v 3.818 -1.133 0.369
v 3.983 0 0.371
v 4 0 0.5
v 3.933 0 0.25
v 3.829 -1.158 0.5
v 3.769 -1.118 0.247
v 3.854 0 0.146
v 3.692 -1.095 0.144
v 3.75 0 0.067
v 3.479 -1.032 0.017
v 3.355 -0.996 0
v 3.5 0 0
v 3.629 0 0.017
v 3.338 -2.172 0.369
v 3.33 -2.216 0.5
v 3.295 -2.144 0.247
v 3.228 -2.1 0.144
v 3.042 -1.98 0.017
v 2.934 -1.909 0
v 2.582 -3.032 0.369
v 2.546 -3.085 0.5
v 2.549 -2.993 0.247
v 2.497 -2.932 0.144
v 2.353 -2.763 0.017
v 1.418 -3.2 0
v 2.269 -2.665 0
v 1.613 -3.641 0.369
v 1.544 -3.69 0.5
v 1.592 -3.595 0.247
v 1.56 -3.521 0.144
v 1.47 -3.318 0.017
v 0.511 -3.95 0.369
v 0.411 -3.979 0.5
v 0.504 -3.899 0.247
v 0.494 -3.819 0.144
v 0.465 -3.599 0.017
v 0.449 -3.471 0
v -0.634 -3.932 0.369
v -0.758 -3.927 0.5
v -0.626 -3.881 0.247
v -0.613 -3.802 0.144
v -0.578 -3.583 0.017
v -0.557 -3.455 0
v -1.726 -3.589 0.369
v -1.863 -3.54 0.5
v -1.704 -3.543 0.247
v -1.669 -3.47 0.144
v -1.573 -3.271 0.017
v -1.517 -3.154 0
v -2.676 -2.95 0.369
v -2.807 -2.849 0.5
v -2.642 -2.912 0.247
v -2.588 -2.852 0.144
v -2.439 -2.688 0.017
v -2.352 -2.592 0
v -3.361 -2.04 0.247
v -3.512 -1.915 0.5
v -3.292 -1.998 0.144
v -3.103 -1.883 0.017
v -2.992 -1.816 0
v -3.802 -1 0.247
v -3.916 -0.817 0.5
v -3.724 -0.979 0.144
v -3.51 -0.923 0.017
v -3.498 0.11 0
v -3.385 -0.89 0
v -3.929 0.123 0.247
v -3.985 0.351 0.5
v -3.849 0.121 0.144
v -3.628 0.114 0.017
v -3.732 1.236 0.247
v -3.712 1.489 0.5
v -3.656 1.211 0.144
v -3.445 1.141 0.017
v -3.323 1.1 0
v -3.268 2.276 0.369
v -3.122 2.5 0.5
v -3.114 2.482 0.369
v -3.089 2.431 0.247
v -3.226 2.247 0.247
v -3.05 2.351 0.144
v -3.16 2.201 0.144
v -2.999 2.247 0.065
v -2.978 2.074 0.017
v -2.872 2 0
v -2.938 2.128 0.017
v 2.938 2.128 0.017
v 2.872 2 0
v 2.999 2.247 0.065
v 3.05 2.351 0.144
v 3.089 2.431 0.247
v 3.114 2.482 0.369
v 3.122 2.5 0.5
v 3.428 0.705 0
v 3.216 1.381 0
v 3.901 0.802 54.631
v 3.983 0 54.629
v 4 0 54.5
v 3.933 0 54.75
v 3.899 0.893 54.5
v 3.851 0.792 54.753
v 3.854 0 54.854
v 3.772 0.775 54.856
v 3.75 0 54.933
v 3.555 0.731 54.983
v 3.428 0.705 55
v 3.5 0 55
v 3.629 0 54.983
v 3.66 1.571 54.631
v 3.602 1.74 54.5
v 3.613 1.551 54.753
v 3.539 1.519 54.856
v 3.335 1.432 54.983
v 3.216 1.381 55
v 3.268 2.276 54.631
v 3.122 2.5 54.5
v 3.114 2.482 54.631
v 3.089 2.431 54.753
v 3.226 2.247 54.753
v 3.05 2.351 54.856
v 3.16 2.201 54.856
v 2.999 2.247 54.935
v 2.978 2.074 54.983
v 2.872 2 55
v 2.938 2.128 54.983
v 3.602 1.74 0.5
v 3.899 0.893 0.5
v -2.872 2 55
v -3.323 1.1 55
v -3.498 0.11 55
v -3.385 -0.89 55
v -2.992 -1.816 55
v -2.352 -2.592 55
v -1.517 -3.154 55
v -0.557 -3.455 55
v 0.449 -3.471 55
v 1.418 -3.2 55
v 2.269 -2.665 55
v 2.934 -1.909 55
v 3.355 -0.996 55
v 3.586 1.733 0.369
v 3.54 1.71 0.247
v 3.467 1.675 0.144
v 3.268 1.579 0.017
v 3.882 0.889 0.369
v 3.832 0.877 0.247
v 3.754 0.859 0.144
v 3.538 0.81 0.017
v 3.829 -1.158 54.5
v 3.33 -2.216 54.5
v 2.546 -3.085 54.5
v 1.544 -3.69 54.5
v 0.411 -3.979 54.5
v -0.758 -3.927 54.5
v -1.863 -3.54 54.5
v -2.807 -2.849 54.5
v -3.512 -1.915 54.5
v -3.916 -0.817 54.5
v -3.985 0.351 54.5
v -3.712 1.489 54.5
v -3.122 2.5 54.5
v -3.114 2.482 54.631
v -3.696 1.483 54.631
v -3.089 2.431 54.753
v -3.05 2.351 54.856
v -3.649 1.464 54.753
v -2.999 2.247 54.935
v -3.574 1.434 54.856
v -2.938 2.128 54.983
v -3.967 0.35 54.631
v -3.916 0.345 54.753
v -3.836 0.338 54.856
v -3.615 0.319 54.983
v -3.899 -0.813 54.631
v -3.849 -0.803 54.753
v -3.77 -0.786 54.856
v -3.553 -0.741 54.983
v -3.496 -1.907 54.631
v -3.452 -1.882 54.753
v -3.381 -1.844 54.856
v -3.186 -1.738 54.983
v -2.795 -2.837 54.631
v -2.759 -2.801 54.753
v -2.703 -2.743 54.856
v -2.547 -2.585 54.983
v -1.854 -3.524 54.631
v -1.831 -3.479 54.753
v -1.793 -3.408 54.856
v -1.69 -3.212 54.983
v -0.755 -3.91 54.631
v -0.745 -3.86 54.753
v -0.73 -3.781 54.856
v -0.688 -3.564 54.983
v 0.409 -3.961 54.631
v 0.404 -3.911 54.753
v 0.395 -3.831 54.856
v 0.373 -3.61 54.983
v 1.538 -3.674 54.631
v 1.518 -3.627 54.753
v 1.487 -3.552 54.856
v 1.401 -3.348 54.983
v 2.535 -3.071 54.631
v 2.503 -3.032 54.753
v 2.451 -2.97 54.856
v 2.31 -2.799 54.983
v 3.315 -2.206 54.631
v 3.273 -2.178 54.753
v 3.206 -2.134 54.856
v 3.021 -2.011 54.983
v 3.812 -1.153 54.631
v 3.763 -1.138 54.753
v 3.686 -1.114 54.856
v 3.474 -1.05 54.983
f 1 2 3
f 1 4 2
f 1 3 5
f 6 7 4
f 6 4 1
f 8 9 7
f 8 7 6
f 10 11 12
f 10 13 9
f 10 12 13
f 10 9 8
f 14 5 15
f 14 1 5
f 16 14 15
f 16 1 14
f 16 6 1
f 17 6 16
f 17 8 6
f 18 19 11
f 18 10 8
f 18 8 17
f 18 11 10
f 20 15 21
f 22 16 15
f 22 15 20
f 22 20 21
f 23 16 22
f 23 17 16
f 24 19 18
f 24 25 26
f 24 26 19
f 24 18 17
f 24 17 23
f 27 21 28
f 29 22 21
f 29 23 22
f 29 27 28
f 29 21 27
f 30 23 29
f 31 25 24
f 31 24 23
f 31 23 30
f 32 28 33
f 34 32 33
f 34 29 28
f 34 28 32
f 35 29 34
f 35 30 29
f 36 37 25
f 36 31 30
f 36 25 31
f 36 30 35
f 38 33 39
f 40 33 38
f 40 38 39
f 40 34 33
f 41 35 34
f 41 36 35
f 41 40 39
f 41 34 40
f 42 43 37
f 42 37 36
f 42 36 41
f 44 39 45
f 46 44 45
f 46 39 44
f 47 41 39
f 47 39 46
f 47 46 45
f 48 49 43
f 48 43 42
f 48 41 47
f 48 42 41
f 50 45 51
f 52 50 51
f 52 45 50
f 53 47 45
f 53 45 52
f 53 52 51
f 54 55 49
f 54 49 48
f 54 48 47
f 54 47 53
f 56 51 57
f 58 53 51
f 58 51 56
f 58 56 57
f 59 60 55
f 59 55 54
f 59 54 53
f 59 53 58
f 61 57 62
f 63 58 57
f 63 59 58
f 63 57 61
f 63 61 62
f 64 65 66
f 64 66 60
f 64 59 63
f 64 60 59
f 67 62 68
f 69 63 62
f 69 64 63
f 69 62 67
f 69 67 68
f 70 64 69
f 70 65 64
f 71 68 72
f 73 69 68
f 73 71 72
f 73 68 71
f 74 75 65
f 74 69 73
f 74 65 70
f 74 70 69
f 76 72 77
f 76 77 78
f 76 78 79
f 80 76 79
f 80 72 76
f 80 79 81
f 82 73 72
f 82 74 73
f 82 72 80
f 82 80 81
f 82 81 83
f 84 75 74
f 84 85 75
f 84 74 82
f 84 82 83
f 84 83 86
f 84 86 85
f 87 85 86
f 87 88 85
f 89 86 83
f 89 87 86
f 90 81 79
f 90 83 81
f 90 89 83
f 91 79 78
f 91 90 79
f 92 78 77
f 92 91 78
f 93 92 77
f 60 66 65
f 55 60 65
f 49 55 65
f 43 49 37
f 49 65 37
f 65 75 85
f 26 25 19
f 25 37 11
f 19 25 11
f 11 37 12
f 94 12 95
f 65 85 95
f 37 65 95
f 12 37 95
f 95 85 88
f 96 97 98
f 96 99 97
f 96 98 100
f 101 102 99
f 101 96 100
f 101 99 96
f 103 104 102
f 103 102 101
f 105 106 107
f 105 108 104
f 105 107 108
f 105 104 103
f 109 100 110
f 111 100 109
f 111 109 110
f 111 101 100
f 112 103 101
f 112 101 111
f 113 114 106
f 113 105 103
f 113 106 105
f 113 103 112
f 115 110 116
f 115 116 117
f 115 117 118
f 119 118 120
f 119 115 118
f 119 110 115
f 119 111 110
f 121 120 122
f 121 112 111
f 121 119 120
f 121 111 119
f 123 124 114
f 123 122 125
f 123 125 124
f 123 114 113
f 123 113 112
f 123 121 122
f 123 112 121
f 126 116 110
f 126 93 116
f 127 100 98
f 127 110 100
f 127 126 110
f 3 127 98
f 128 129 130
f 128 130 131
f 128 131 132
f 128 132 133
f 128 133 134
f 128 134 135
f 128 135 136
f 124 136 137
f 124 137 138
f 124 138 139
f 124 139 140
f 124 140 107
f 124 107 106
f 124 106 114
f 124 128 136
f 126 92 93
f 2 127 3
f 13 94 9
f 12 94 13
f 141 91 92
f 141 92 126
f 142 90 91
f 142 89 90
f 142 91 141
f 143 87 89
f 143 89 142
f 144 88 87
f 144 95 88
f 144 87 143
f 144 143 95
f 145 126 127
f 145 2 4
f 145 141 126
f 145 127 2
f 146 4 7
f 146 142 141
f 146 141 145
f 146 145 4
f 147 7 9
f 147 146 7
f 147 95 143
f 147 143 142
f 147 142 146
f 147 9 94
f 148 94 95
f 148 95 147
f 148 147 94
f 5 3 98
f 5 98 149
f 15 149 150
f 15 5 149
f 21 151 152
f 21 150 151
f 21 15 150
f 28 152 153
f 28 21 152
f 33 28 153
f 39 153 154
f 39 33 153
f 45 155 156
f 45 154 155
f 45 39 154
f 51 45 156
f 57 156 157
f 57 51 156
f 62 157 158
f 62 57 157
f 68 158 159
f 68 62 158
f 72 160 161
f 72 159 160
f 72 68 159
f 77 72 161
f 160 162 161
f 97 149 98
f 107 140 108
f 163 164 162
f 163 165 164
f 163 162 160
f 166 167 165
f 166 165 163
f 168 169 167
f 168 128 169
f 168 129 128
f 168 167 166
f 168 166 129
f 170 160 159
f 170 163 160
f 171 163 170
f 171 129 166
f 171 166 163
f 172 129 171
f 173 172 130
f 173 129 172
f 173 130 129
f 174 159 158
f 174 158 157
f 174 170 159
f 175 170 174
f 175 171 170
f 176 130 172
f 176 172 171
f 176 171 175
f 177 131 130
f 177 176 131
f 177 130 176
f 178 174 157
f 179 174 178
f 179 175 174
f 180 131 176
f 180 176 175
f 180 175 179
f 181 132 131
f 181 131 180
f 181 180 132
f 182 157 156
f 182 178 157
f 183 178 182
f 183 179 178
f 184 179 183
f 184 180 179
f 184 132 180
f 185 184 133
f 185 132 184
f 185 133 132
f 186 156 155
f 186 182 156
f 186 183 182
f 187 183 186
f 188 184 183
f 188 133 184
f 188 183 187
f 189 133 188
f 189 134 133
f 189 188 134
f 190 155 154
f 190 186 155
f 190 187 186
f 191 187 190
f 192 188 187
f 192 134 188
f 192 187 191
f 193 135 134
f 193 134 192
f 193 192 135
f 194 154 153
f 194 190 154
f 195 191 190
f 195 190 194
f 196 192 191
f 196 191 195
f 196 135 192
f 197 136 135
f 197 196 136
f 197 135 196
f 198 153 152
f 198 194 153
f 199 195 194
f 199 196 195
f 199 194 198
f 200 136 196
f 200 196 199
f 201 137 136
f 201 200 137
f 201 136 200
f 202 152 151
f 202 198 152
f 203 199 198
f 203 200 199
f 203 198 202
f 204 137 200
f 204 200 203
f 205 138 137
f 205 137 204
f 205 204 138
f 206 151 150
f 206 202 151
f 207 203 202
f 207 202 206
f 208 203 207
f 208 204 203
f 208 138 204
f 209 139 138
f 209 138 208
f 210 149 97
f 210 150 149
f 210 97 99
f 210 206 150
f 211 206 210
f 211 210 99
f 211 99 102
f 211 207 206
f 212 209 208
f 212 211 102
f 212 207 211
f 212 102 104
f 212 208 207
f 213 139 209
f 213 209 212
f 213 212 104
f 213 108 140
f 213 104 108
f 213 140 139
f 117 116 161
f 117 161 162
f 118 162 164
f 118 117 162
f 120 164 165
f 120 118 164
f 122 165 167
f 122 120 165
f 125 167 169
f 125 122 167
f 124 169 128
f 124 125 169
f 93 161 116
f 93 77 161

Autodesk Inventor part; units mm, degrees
ref_plane "YZ Plane" through (0, 0, 0) normal (1, 0, 0) x (0, 1, 0)
ref_plane "XZ Plane" through (0, 0, 0) normal (0, 1, 0) x (-1, 0, 0)
ref_plane "XY Plane" through (0, 0, 0) normal (0, 0, 1) x (1, 0, 0)
sketch "Sketch1" plane through (0, 0, 0) normal (0, 0, 1) x (1, 0, 0)
  circle A0 centre (0, 0) radius 4
  line L0 (-3.1225, 2.5) -> (3.1225, 2.5)
  dimension "d0" = 8
  dimension "d1" = 2.5
extrude "Extrusion1" add sketch "Sketch1" along normal blind 55 contours A0 L0 picked at (-0.7341, 0.0257)
fillet "Fillet1" radius 0.5 4 edges at (0, -4, 55) (0, 2.5, 55) (0, -4, 0) (0, 2.5, 0)
properties part number "8mm D-Shaft axle (3d print)"
